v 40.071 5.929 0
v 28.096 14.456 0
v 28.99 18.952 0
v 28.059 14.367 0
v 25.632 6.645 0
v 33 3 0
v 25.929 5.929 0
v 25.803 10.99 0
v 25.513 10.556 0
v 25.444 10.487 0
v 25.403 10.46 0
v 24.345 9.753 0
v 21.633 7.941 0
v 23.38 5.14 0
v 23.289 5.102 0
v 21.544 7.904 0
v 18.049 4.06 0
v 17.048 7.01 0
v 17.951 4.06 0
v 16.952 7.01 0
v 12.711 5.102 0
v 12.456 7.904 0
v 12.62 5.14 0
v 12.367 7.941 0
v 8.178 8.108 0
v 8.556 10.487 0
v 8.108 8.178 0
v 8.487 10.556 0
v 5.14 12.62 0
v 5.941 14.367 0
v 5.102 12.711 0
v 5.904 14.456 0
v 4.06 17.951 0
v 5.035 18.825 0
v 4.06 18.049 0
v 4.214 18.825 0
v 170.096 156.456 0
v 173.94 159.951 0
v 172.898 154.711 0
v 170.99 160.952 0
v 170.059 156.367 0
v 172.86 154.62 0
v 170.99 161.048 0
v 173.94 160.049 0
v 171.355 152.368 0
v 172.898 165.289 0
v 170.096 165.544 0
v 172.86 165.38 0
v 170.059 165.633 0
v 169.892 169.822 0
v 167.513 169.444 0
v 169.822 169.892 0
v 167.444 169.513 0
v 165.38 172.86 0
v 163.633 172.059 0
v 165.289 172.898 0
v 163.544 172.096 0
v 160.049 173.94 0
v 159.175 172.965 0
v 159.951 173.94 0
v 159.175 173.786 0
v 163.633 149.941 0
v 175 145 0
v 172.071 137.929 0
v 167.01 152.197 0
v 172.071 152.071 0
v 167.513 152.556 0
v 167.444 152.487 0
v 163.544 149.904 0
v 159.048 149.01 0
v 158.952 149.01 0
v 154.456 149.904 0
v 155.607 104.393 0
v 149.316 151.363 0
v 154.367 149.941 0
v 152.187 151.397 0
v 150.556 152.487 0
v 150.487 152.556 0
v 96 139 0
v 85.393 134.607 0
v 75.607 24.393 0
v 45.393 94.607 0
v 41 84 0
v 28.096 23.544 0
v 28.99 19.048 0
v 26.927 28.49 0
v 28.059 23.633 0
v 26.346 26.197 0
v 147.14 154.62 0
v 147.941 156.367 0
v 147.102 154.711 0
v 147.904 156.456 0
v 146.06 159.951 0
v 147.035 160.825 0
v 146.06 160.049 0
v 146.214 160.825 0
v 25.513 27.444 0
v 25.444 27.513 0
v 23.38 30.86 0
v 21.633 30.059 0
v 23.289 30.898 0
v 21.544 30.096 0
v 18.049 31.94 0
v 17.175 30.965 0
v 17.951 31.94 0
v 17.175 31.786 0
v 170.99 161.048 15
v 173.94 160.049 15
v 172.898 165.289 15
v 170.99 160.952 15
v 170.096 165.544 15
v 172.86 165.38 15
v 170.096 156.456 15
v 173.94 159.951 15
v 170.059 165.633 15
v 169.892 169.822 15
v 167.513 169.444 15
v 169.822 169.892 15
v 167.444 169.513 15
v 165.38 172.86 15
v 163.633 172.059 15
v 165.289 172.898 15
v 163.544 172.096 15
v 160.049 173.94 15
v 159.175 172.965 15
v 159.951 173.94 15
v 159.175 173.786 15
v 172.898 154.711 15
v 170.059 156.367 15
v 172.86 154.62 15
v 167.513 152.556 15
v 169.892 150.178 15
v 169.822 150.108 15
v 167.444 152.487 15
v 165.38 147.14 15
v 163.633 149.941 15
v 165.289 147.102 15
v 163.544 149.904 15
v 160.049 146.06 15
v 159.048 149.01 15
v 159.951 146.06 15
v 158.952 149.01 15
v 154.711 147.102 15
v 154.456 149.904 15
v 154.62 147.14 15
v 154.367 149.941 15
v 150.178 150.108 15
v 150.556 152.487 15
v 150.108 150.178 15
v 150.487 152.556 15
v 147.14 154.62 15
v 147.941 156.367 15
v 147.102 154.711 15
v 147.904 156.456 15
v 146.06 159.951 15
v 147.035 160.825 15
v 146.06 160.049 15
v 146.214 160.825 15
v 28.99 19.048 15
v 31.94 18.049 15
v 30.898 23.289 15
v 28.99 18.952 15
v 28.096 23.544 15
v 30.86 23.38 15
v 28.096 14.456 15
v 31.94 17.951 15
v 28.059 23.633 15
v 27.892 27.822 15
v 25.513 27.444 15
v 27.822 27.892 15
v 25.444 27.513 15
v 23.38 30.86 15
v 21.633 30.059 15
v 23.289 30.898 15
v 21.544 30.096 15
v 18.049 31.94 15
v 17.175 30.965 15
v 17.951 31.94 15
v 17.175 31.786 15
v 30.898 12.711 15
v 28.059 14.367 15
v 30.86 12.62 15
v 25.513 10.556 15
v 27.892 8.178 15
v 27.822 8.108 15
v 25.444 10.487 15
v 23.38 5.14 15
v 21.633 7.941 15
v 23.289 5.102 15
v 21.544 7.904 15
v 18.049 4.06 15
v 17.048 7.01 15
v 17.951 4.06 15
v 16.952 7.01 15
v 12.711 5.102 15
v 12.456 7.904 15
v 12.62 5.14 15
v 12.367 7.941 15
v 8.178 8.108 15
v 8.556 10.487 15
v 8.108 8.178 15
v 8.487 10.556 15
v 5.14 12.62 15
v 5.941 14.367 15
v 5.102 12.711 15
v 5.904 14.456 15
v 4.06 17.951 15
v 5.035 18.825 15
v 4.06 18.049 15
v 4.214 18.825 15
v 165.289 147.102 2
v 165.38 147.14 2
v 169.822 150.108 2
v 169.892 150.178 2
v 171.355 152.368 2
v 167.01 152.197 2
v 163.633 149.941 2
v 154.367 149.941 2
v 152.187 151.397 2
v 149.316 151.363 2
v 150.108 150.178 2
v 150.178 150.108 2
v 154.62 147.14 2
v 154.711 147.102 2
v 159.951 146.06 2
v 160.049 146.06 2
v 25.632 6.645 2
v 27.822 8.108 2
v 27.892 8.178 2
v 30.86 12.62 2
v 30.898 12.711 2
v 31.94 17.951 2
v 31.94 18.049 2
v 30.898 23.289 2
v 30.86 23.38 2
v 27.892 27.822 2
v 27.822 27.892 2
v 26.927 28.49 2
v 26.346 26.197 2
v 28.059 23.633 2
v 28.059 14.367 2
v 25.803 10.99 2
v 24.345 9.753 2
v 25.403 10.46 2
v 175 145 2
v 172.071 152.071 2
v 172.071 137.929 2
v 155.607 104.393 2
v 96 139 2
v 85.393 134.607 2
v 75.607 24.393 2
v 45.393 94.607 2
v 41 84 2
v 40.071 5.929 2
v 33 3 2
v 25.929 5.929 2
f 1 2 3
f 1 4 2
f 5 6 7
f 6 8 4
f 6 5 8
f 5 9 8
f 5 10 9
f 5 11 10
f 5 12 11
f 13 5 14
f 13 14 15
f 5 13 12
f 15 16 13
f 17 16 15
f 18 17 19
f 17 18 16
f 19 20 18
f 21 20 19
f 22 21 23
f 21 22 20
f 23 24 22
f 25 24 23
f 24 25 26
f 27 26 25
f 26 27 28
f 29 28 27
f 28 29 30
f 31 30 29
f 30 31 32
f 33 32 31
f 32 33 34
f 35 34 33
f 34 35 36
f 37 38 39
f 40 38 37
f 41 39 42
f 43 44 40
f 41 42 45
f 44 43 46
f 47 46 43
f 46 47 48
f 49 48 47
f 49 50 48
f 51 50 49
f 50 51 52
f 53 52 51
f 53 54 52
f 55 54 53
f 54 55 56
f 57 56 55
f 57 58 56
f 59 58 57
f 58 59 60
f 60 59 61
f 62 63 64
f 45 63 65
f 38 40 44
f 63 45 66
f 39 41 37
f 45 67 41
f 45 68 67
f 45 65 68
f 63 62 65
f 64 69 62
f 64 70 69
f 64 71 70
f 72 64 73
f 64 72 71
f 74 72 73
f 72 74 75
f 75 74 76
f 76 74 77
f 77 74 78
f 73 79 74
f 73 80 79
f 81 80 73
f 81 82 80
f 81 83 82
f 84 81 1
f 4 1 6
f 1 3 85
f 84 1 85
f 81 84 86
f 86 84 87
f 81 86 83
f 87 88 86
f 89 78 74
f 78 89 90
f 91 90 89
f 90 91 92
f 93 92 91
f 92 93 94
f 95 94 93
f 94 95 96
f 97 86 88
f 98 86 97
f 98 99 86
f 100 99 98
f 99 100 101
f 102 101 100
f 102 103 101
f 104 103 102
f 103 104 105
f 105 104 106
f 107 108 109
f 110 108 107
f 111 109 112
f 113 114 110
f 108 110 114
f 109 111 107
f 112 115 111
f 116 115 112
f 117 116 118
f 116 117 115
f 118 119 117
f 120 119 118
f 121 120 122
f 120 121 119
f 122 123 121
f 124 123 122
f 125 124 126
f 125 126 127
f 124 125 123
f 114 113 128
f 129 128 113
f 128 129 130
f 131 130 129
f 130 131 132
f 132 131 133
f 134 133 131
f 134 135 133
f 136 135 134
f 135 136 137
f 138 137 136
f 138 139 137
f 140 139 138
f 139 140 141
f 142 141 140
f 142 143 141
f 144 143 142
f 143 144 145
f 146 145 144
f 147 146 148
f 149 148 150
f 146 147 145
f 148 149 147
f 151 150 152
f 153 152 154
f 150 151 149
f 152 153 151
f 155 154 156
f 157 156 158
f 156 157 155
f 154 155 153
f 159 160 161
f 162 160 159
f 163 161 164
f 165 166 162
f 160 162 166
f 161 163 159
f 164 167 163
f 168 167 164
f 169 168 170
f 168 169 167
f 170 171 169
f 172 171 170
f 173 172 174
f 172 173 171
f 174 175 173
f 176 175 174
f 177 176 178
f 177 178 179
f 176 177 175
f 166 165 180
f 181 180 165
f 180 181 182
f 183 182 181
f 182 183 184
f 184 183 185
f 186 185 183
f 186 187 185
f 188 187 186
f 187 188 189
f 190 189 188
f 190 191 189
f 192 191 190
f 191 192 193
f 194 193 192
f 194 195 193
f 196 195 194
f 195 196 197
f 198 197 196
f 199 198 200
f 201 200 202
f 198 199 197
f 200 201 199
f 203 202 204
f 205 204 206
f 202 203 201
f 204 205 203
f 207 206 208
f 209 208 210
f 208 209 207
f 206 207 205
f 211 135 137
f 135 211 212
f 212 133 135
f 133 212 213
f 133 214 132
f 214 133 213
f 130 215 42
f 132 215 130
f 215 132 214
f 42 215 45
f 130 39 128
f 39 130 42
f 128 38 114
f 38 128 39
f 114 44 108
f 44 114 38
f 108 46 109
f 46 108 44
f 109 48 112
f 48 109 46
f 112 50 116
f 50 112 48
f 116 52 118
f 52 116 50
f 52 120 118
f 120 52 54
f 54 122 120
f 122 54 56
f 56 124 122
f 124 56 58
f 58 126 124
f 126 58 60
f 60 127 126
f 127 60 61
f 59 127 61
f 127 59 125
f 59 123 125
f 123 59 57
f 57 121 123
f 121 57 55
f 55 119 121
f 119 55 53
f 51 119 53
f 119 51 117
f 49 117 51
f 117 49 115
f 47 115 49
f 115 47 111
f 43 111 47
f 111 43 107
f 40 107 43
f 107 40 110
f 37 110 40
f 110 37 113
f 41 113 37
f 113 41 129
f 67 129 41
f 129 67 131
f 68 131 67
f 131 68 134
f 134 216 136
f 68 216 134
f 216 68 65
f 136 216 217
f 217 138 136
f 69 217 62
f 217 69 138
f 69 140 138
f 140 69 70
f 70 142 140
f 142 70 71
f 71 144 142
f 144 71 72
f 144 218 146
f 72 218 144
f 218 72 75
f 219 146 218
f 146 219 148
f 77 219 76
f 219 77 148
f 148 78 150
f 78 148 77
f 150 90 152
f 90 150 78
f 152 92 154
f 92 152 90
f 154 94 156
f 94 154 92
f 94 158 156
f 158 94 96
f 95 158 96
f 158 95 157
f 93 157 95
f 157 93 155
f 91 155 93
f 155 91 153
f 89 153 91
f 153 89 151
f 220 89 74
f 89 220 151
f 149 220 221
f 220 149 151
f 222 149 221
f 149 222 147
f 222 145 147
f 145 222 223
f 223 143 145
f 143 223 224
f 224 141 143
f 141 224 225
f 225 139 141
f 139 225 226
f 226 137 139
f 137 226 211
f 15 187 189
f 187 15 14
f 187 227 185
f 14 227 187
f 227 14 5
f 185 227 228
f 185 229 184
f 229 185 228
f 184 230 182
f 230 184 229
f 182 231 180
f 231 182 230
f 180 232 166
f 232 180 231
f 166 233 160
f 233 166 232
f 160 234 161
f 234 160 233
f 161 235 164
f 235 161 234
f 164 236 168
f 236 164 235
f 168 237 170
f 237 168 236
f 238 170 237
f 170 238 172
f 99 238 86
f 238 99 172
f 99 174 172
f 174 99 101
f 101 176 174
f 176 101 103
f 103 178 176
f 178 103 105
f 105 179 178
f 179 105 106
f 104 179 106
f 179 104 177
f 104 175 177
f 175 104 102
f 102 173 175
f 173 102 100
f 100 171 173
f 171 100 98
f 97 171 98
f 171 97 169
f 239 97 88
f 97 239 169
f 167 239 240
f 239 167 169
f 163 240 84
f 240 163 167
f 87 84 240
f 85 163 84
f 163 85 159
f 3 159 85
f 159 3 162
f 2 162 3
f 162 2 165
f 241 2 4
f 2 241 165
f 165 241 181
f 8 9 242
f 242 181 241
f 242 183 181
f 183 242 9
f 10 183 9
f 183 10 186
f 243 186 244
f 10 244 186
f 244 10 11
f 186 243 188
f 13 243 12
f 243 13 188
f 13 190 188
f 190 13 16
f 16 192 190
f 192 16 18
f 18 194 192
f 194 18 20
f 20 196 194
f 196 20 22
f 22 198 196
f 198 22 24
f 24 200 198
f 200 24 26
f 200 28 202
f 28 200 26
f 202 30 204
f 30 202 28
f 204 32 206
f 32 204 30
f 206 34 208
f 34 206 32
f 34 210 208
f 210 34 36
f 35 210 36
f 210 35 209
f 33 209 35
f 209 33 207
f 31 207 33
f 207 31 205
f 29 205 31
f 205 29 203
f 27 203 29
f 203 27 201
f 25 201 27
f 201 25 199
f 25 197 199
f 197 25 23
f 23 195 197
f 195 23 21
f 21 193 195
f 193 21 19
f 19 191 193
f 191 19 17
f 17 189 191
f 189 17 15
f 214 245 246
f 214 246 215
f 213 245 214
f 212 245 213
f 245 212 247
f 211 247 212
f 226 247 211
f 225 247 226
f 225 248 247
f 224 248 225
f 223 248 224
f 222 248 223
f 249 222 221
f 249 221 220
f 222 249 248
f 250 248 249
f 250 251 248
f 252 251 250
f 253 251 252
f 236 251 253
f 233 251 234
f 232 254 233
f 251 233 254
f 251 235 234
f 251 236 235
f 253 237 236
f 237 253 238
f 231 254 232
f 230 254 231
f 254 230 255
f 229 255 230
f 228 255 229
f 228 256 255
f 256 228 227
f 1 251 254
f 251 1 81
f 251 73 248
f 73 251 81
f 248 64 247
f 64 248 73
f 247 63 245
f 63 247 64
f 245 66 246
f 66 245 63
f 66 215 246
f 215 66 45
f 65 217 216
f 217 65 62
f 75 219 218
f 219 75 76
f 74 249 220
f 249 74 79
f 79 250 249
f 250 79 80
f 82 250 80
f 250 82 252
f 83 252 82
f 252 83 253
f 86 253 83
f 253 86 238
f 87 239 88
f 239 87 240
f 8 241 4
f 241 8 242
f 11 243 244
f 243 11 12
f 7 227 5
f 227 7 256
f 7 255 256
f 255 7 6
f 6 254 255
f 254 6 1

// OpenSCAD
$fn=8;
%square(180);

linear_extrude(15)offset(delta=.5 , chamfer=true
)offset(-.5 , chamfer=true){
    $fn=16;
translate([4,4])difference(){
translate([14,14])circle(27.9/2);
translate([14-1,14+1])circle(24/2);
    
    
    }
    translate([146,146])difference(){
translate([14,14])circle(27.9/2);
translate([14-1,14+1])circle(24/2);
    
    
    }}
linear_extrude(2){
difference(){
translate([10,-10])hull(){
 translate([9,9]) translate([14,14])circle(20/2);
     translate([141,141])   translate([14,14])circle(20/2);
     translate([110,110])   translate([-24,24])circle(30/2);
     translate([70,70])   translate([-24,24])circle(30/2);
    translate([130,130])   translate([5,-5])circle(30/2);
     translate([50,50])   translate([5,-5])circle(30/2);
    
    }    
    
 translate([4,4])     translate([14-1,14+1])circle(24/2, $fn=16);
 translate([146,146])  translate([14-1,14+1])circle(24/2, $fn=16);
    
    
    }}
